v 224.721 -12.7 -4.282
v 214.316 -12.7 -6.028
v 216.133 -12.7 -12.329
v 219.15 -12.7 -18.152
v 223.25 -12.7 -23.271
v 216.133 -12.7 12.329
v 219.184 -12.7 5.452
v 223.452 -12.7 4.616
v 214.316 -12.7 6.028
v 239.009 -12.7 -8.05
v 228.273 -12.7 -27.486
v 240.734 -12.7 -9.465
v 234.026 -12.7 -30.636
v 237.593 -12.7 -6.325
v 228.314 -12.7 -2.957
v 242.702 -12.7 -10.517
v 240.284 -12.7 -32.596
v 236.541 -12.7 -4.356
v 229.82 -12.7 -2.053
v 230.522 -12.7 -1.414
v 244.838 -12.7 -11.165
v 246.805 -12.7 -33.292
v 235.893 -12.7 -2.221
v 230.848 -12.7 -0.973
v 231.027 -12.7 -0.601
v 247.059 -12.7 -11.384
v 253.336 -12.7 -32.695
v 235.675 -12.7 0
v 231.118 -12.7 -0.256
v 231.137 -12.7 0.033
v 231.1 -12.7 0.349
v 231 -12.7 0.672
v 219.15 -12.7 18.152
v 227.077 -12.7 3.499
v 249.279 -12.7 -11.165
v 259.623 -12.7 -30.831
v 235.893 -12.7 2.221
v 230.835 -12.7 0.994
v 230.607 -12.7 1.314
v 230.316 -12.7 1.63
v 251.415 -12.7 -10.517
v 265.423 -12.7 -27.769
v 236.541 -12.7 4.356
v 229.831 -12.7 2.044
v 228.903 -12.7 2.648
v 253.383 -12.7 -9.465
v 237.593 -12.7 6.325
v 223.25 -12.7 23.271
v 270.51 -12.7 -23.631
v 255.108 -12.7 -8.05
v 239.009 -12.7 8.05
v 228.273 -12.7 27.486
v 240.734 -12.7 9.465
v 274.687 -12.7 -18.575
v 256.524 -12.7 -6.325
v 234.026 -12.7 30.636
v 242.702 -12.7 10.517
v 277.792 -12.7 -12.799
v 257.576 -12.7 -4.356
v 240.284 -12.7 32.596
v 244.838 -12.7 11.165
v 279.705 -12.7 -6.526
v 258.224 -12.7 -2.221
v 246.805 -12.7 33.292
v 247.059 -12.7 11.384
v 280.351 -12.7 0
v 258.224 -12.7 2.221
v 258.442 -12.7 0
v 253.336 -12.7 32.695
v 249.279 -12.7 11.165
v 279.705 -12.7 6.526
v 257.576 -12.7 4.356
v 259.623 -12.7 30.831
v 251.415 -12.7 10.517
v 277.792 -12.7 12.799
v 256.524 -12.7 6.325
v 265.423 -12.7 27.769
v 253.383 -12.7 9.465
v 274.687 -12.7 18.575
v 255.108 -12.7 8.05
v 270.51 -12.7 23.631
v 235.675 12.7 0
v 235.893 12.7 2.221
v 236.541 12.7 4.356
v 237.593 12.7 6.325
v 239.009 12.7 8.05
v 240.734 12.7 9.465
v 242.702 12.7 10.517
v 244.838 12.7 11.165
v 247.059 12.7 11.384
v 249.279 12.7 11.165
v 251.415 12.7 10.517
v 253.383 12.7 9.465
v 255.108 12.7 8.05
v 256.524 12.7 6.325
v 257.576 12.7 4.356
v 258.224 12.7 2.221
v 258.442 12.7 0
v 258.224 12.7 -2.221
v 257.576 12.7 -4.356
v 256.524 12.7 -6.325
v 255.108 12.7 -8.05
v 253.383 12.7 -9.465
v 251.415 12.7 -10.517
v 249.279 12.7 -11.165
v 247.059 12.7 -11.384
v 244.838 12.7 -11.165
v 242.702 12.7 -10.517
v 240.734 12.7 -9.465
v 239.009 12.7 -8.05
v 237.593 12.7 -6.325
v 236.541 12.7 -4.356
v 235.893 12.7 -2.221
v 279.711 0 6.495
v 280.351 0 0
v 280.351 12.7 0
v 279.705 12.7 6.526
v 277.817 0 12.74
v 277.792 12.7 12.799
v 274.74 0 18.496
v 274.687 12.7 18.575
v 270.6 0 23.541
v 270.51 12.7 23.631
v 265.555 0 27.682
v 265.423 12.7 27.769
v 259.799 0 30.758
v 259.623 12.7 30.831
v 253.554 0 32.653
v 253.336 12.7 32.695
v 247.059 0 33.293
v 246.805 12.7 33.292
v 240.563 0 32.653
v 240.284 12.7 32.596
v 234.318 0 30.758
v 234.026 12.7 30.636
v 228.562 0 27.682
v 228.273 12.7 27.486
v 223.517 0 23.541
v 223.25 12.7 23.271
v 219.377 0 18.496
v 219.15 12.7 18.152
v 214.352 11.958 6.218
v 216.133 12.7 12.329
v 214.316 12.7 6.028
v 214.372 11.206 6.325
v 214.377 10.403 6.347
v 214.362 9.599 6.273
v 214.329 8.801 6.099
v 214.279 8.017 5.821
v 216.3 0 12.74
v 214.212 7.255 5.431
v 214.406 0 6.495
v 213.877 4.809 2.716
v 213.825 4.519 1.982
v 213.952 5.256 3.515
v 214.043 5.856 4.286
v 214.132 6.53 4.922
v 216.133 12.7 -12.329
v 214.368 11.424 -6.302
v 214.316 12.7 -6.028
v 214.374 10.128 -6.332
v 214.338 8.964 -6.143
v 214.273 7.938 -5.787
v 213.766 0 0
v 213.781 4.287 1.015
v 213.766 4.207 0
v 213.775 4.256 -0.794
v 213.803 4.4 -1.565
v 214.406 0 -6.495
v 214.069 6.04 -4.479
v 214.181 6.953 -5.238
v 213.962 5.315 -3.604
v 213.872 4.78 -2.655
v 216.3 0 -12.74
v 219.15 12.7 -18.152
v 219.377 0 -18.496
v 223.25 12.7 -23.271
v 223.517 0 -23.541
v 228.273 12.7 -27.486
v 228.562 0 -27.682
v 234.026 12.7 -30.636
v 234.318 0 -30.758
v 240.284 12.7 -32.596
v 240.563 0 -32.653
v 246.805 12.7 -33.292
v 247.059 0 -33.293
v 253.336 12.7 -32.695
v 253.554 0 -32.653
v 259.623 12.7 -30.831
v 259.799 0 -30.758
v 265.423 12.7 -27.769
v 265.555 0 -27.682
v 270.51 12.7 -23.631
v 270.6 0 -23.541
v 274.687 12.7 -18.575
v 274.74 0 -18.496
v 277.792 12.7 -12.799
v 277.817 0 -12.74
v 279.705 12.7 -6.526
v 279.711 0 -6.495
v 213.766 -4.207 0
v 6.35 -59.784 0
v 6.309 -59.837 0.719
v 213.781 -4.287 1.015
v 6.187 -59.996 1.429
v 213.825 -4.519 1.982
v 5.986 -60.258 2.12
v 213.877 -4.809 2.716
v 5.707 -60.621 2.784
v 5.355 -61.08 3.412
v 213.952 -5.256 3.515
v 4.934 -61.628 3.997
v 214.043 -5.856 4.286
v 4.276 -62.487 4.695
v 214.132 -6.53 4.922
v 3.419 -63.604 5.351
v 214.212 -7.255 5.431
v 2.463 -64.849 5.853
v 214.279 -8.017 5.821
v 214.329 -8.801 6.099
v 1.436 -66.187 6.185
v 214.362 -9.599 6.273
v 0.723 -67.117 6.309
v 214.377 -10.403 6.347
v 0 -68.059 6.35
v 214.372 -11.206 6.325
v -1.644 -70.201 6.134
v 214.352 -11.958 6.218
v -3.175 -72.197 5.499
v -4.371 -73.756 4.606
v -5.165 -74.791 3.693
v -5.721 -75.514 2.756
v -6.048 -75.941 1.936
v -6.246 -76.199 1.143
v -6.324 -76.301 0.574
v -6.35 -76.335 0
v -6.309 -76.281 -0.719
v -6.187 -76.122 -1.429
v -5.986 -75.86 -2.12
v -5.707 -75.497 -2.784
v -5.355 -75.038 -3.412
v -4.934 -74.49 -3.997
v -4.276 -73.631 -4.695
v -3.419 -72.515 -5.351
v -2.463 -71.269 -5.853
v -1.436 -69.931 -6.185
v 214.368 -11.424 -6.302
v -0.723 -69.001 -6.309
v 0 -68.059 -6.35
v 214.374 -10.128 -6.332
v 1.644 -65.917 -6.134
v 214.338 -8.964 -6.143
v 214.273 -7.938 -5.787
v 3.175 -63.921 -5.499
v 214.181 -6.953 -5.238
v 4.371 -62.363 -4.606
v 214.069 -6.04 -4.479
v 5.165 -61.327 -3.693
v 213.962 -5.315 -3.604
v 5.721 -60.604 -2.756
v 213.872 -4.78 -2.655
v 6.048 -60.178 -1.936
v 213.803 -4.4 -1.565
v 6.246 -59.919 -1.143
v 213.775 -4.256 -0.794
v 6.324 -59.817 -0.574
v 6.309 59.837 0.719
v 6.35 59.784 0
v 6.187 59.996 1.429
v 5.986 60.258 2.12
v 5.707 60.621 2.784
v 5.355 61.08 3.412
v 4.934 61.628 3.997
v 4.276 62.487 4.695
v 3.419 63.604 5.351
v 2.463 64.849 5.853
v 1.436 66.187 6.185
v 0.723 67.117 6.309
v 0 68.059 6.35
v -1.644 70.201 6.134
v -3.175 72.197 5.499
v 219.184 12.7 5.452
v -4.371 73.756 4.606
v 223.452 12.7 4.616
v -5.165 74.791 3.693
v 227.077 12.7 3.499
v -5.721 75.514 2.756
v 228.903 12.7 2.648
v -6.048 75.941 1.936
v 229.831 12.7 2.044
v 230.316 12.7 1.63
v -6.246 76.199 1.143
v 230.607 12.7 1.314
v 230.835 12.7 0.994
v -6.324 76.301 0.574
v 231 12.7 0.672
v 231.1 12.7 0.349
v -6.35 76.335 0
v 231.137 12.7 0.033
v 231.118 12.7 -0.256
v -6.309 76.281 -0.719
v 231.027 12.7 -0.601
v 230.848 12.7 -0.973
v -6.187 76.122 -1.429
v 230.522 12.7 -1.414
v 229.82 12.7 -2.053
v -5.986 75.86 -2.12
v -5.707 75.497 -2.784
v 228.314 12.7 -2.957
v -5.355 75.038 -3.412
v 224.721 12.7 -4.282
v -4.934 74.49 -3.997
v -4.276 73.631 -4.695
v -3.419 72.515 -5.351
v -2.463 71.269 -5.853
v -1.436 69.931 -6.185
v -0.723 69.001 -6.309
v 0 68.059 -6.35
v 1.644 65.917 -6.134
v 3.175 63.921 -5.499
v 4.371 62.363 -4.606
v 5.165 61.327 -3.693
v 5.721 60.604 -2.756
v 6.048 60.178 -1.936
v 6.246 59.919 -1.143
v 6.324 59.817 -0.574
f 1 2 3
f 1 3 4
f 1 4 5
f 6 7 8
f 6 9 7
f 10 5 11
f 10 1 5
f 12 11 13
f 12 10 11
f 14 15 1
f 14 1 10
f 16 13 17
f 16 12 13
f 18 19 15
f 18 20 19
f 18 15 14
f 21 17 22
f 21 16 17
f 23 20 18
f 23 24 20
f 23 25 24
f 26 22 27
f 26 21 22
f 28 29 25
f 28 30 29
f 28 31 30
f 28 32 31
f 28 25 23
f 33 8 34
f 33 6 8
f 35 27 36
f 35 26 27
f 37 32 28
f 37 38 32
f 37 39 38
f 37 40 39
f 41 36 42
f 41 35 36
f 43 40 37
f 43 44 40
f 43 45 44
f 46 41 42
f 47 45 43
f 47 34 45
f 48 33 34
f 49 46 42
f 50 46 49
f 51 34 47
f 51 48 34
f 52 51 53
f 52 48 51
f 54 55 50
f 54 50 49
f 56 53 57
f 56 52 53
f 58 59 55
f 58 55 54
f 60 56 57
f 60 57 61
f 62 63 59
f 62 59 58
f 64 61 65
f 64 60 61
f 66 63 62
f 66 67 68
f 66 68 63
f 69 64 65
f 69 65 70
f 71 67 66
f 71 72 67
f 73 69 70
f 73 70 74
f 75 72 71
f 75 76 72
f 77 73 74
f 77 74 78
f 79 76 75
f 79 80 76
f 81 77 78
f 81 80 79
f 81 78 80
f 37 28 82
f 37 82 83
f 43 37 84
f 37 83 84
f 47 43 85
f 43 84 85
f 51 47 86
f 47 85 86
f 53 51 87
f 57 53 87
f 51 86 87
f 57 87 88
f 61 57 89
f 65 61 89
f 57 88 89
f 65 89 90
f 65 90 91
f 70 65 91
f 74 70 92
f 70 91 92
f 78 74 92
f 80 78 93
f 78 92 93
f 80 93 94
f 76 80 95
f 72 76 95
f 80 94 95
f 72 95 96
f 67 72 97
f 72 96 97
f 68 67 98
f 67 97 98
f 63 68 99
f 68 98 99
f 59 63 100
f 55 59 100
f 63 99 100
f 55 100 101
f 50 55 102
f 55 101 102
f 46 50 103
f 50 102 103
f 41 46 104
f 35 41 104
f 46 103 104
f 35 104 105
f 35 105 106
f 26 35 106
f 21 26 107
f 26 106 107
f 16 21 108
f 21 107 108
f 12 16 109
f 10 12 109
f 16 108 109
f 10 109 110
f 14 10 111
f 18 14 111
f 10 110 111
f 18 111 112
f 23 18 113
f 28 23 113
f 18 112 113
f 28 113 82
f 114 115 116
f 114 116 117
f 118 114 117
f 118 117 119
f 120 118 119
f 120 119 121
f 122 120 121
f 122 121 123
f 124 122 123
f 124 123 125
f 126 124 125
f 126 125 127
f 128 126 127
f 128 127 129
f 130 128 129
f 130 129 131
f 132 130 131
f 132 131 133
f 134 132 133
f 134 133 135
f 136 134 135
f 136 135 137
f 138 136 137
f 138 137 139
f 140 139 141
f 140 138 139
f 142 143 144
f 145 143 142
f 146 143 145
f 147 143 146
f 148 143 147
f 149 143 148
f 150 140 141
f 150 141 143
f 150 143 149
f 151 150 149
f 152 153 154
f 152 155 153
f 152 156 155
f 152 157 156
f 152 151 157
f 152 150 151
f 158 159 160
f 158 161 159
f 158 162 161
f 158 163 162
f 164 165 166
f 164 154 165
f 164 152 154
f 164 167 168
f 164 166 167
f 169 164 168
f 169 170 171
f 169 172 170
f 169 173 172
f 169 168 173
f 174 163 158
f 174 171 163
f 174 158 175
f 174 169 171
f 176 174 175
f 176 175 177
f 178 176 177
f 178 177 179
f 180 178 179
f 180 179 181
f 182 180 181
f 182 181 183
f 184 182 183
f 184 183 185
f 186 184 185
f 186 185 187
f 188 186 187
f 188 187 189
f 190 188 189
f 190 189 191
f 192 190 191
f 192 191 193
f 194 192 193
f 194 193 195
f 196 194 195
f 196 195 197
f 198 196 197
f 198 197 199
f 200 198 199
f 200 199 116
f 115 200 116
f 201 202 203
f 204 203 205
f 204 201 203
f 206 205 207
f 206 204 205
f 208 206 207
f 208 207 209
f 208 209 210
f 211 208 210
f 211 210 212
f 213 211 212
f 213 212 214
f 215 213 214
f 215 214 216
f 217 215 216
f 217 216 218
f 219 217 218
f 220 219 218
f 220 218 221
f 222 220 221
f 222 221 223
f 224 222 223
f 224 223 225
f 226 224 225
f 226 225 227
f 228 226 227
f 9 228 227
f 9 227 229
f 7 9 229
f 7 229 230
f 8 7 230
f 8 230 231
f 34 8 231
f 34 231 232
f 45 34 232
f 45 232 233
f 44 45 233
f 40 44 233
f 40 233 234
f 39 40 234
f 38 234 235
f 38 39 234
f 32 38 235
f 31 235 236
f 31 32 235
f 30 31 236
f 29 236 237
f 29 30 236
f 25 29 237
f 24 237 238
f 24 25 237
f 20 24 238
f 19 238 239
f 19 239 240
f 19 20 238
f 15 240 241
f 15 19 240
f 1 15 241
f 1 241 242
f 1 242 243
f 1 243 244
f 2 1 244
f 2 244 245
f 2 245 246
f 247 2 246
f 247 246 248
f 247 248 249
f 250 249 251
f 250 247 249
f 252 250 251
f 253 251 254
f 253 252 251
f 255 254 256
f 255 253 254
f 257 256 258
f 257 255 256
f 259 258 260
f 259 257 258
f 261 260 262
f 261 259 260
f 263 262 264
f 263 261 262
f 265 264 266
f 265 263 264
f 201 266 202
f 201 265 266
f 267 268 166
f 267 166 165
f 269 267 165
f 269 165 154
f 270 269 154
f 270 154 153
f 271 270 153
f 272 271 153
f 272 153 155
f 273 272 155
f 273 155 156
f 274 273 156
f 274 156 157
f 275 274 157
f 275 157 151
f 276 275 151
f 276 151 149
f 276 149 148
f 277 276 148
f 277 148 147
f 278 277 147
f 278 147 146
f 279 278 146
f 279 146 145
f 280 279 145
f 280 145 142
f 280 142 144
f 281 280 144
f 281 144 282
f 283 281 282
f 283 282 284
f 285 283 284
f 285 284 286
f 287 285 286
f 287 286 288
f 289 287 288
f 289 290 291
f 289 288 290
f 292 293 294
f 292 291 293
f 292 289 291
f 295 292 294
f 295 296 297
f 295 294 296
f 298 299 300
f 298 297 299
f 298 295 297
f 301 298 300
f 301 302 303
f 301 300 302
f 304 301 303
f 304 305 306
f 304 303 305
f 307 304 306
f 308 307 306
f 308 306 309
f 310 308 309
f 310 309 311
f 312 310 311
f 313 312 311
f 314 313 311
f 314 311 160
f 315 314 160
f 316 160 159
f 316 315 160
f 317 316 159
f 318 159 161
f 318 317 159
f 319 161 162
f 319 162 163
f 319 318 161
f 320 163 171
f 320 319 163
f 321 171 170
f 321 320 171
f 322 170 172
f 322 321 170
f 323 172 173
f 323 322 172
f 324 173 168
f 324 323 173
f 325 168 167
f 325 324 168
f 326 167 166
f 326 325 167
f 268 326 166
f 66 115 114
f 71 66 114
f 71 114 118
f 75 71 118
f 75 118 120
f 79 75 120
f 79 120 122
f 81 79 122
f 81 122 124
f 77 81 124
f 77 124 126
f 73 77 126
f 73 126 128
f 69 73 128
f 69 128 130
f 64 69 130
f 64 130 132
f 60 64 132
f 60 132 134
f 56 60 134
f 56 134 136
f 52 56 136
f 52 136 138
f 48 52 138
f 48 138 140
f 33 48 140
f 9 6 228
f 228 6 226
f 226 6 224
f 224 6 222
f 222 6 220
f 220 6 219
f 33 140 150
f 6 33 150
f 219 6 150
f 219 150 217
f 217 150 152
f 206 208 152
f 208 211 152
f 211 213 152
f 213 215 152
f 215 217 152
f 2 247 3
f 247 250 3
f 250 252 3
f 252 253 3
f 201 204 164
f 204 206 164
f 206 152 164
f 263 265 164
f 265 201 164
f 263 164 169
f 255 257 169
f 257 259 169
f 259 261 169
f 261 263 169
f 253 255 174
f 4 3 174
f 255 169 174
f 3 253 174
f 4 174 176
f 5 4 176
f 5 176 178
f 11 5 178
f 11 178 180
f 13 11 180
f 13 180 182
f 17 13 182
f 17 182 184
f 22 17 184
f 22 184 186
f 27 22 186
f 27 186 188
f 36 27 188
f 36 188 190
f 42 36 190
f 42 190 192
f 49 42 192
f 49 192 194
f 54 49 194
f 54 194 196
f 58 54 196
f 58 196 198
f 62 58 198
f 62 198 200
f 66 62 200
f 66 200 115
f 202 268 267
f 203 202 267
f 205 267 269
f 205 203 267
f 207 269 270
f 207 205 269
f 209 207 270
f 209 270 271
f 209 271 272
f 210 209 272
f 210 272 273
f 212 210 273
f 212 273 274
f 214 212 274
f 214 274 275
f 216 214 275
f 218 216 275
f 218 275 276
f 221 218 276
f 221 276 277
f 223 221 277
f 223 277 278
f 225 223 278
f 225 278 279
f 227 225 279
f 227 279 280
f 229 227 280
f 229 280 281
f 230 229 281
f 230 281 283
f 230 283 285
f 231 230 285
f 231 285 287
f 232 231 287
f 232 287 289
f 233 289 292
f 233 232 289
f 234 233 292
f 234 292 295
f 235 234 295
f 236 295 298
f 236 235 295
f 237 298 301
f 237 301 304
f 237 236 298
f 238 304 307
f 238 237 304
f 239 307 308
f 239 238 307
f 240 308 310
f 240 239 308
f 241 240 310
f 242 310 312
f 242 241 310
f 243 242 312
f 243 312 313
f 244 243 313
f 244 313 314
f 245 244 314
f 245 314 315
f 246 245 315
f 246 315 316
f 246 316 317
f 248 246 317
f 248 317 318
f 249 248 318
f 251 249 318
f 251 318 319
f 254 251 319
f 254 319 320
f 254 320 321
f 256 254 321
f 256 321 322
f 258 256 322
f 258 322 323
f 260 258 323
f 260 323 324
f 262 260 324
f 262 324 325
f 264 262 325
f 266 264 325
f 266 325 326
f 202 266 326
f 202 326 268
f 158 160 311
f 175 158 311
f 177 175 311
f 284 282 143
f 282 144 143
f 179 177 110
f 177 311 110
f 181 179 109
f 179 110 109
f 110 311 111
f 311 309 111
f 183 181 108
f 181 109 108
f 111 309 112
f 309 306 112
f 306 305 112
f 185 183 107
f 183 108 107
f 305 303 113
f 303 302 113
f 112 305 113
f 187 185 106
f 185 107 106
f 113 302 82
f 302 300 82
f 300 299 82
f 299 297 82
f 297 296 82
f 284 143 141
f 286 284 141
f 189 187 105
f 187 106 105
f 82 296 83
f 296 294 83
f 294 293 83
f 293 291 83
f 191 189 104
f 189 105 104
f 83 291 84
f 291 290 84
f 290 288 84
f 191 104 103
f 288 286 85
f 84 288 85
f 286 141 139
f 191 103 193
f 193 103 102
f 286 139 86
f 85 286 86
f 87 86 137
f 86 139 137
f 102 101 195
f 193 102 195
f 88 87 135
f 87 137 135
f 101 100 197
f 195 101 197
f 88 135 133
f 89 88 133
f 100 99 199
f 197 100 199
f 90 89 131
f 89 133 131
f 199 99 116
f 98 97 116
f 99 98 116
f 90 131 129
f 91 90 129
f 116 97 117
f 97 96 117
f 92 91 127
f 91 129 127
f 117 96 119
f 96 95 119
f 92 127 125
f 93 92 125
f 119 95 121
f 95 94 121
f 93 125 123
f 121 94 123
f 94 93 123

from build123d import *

# Parameters (mm, degrees)
F1_R          = 6.35
F3_R          = 33.2925149607
F4_DEPTH      = 12.7
F4_DEPTH_BACK = 12.7
F5_R          = 11.3838907511
F6_DEPTH      = 25.4


with BuildPart() as f2:
    # F2: sweep along a path in F0
    with BuildLine(Plane.XY) as f2_path:
        Line((0, 68.0590948775), (0, -68.0590948775))
        Line((0, -68.0590948775), (254, 0))
        Line((254, 0), (0, 68.0590948775))
    # F1 (on Front) → F2 (sweep)
    with BuildSketch(Plane.XZ):
        Circle(F1_R)
    sweep(path=f2_path.line, transition=Transition.RIGHT)

    # F3 (on Front) → F4 (join, two sides)
    with BuildSketch(Plane.XZ) as f4_sk:
        with Locations((247.0585107803, 0)):
            Circle(F3_R)
    extrude(amount=F4_DEPTH)
    extrude(f4_sk.sketch, amount=-F4_DEPTH_BACK)

    # F5 (on face) → F6 (cut)
    with BuildSketch(Plane(origin=(0, 12.7, 0), x_dir=(-1, 0, 0), z_dir=(0, 1, 0))):
        with Locations((-247.0585107803, 0)):
            Circle(F5_R)
    extrude(amount=-F6_DEPTH, mode=Mode.SUBTRACT)


solid = f2.part
